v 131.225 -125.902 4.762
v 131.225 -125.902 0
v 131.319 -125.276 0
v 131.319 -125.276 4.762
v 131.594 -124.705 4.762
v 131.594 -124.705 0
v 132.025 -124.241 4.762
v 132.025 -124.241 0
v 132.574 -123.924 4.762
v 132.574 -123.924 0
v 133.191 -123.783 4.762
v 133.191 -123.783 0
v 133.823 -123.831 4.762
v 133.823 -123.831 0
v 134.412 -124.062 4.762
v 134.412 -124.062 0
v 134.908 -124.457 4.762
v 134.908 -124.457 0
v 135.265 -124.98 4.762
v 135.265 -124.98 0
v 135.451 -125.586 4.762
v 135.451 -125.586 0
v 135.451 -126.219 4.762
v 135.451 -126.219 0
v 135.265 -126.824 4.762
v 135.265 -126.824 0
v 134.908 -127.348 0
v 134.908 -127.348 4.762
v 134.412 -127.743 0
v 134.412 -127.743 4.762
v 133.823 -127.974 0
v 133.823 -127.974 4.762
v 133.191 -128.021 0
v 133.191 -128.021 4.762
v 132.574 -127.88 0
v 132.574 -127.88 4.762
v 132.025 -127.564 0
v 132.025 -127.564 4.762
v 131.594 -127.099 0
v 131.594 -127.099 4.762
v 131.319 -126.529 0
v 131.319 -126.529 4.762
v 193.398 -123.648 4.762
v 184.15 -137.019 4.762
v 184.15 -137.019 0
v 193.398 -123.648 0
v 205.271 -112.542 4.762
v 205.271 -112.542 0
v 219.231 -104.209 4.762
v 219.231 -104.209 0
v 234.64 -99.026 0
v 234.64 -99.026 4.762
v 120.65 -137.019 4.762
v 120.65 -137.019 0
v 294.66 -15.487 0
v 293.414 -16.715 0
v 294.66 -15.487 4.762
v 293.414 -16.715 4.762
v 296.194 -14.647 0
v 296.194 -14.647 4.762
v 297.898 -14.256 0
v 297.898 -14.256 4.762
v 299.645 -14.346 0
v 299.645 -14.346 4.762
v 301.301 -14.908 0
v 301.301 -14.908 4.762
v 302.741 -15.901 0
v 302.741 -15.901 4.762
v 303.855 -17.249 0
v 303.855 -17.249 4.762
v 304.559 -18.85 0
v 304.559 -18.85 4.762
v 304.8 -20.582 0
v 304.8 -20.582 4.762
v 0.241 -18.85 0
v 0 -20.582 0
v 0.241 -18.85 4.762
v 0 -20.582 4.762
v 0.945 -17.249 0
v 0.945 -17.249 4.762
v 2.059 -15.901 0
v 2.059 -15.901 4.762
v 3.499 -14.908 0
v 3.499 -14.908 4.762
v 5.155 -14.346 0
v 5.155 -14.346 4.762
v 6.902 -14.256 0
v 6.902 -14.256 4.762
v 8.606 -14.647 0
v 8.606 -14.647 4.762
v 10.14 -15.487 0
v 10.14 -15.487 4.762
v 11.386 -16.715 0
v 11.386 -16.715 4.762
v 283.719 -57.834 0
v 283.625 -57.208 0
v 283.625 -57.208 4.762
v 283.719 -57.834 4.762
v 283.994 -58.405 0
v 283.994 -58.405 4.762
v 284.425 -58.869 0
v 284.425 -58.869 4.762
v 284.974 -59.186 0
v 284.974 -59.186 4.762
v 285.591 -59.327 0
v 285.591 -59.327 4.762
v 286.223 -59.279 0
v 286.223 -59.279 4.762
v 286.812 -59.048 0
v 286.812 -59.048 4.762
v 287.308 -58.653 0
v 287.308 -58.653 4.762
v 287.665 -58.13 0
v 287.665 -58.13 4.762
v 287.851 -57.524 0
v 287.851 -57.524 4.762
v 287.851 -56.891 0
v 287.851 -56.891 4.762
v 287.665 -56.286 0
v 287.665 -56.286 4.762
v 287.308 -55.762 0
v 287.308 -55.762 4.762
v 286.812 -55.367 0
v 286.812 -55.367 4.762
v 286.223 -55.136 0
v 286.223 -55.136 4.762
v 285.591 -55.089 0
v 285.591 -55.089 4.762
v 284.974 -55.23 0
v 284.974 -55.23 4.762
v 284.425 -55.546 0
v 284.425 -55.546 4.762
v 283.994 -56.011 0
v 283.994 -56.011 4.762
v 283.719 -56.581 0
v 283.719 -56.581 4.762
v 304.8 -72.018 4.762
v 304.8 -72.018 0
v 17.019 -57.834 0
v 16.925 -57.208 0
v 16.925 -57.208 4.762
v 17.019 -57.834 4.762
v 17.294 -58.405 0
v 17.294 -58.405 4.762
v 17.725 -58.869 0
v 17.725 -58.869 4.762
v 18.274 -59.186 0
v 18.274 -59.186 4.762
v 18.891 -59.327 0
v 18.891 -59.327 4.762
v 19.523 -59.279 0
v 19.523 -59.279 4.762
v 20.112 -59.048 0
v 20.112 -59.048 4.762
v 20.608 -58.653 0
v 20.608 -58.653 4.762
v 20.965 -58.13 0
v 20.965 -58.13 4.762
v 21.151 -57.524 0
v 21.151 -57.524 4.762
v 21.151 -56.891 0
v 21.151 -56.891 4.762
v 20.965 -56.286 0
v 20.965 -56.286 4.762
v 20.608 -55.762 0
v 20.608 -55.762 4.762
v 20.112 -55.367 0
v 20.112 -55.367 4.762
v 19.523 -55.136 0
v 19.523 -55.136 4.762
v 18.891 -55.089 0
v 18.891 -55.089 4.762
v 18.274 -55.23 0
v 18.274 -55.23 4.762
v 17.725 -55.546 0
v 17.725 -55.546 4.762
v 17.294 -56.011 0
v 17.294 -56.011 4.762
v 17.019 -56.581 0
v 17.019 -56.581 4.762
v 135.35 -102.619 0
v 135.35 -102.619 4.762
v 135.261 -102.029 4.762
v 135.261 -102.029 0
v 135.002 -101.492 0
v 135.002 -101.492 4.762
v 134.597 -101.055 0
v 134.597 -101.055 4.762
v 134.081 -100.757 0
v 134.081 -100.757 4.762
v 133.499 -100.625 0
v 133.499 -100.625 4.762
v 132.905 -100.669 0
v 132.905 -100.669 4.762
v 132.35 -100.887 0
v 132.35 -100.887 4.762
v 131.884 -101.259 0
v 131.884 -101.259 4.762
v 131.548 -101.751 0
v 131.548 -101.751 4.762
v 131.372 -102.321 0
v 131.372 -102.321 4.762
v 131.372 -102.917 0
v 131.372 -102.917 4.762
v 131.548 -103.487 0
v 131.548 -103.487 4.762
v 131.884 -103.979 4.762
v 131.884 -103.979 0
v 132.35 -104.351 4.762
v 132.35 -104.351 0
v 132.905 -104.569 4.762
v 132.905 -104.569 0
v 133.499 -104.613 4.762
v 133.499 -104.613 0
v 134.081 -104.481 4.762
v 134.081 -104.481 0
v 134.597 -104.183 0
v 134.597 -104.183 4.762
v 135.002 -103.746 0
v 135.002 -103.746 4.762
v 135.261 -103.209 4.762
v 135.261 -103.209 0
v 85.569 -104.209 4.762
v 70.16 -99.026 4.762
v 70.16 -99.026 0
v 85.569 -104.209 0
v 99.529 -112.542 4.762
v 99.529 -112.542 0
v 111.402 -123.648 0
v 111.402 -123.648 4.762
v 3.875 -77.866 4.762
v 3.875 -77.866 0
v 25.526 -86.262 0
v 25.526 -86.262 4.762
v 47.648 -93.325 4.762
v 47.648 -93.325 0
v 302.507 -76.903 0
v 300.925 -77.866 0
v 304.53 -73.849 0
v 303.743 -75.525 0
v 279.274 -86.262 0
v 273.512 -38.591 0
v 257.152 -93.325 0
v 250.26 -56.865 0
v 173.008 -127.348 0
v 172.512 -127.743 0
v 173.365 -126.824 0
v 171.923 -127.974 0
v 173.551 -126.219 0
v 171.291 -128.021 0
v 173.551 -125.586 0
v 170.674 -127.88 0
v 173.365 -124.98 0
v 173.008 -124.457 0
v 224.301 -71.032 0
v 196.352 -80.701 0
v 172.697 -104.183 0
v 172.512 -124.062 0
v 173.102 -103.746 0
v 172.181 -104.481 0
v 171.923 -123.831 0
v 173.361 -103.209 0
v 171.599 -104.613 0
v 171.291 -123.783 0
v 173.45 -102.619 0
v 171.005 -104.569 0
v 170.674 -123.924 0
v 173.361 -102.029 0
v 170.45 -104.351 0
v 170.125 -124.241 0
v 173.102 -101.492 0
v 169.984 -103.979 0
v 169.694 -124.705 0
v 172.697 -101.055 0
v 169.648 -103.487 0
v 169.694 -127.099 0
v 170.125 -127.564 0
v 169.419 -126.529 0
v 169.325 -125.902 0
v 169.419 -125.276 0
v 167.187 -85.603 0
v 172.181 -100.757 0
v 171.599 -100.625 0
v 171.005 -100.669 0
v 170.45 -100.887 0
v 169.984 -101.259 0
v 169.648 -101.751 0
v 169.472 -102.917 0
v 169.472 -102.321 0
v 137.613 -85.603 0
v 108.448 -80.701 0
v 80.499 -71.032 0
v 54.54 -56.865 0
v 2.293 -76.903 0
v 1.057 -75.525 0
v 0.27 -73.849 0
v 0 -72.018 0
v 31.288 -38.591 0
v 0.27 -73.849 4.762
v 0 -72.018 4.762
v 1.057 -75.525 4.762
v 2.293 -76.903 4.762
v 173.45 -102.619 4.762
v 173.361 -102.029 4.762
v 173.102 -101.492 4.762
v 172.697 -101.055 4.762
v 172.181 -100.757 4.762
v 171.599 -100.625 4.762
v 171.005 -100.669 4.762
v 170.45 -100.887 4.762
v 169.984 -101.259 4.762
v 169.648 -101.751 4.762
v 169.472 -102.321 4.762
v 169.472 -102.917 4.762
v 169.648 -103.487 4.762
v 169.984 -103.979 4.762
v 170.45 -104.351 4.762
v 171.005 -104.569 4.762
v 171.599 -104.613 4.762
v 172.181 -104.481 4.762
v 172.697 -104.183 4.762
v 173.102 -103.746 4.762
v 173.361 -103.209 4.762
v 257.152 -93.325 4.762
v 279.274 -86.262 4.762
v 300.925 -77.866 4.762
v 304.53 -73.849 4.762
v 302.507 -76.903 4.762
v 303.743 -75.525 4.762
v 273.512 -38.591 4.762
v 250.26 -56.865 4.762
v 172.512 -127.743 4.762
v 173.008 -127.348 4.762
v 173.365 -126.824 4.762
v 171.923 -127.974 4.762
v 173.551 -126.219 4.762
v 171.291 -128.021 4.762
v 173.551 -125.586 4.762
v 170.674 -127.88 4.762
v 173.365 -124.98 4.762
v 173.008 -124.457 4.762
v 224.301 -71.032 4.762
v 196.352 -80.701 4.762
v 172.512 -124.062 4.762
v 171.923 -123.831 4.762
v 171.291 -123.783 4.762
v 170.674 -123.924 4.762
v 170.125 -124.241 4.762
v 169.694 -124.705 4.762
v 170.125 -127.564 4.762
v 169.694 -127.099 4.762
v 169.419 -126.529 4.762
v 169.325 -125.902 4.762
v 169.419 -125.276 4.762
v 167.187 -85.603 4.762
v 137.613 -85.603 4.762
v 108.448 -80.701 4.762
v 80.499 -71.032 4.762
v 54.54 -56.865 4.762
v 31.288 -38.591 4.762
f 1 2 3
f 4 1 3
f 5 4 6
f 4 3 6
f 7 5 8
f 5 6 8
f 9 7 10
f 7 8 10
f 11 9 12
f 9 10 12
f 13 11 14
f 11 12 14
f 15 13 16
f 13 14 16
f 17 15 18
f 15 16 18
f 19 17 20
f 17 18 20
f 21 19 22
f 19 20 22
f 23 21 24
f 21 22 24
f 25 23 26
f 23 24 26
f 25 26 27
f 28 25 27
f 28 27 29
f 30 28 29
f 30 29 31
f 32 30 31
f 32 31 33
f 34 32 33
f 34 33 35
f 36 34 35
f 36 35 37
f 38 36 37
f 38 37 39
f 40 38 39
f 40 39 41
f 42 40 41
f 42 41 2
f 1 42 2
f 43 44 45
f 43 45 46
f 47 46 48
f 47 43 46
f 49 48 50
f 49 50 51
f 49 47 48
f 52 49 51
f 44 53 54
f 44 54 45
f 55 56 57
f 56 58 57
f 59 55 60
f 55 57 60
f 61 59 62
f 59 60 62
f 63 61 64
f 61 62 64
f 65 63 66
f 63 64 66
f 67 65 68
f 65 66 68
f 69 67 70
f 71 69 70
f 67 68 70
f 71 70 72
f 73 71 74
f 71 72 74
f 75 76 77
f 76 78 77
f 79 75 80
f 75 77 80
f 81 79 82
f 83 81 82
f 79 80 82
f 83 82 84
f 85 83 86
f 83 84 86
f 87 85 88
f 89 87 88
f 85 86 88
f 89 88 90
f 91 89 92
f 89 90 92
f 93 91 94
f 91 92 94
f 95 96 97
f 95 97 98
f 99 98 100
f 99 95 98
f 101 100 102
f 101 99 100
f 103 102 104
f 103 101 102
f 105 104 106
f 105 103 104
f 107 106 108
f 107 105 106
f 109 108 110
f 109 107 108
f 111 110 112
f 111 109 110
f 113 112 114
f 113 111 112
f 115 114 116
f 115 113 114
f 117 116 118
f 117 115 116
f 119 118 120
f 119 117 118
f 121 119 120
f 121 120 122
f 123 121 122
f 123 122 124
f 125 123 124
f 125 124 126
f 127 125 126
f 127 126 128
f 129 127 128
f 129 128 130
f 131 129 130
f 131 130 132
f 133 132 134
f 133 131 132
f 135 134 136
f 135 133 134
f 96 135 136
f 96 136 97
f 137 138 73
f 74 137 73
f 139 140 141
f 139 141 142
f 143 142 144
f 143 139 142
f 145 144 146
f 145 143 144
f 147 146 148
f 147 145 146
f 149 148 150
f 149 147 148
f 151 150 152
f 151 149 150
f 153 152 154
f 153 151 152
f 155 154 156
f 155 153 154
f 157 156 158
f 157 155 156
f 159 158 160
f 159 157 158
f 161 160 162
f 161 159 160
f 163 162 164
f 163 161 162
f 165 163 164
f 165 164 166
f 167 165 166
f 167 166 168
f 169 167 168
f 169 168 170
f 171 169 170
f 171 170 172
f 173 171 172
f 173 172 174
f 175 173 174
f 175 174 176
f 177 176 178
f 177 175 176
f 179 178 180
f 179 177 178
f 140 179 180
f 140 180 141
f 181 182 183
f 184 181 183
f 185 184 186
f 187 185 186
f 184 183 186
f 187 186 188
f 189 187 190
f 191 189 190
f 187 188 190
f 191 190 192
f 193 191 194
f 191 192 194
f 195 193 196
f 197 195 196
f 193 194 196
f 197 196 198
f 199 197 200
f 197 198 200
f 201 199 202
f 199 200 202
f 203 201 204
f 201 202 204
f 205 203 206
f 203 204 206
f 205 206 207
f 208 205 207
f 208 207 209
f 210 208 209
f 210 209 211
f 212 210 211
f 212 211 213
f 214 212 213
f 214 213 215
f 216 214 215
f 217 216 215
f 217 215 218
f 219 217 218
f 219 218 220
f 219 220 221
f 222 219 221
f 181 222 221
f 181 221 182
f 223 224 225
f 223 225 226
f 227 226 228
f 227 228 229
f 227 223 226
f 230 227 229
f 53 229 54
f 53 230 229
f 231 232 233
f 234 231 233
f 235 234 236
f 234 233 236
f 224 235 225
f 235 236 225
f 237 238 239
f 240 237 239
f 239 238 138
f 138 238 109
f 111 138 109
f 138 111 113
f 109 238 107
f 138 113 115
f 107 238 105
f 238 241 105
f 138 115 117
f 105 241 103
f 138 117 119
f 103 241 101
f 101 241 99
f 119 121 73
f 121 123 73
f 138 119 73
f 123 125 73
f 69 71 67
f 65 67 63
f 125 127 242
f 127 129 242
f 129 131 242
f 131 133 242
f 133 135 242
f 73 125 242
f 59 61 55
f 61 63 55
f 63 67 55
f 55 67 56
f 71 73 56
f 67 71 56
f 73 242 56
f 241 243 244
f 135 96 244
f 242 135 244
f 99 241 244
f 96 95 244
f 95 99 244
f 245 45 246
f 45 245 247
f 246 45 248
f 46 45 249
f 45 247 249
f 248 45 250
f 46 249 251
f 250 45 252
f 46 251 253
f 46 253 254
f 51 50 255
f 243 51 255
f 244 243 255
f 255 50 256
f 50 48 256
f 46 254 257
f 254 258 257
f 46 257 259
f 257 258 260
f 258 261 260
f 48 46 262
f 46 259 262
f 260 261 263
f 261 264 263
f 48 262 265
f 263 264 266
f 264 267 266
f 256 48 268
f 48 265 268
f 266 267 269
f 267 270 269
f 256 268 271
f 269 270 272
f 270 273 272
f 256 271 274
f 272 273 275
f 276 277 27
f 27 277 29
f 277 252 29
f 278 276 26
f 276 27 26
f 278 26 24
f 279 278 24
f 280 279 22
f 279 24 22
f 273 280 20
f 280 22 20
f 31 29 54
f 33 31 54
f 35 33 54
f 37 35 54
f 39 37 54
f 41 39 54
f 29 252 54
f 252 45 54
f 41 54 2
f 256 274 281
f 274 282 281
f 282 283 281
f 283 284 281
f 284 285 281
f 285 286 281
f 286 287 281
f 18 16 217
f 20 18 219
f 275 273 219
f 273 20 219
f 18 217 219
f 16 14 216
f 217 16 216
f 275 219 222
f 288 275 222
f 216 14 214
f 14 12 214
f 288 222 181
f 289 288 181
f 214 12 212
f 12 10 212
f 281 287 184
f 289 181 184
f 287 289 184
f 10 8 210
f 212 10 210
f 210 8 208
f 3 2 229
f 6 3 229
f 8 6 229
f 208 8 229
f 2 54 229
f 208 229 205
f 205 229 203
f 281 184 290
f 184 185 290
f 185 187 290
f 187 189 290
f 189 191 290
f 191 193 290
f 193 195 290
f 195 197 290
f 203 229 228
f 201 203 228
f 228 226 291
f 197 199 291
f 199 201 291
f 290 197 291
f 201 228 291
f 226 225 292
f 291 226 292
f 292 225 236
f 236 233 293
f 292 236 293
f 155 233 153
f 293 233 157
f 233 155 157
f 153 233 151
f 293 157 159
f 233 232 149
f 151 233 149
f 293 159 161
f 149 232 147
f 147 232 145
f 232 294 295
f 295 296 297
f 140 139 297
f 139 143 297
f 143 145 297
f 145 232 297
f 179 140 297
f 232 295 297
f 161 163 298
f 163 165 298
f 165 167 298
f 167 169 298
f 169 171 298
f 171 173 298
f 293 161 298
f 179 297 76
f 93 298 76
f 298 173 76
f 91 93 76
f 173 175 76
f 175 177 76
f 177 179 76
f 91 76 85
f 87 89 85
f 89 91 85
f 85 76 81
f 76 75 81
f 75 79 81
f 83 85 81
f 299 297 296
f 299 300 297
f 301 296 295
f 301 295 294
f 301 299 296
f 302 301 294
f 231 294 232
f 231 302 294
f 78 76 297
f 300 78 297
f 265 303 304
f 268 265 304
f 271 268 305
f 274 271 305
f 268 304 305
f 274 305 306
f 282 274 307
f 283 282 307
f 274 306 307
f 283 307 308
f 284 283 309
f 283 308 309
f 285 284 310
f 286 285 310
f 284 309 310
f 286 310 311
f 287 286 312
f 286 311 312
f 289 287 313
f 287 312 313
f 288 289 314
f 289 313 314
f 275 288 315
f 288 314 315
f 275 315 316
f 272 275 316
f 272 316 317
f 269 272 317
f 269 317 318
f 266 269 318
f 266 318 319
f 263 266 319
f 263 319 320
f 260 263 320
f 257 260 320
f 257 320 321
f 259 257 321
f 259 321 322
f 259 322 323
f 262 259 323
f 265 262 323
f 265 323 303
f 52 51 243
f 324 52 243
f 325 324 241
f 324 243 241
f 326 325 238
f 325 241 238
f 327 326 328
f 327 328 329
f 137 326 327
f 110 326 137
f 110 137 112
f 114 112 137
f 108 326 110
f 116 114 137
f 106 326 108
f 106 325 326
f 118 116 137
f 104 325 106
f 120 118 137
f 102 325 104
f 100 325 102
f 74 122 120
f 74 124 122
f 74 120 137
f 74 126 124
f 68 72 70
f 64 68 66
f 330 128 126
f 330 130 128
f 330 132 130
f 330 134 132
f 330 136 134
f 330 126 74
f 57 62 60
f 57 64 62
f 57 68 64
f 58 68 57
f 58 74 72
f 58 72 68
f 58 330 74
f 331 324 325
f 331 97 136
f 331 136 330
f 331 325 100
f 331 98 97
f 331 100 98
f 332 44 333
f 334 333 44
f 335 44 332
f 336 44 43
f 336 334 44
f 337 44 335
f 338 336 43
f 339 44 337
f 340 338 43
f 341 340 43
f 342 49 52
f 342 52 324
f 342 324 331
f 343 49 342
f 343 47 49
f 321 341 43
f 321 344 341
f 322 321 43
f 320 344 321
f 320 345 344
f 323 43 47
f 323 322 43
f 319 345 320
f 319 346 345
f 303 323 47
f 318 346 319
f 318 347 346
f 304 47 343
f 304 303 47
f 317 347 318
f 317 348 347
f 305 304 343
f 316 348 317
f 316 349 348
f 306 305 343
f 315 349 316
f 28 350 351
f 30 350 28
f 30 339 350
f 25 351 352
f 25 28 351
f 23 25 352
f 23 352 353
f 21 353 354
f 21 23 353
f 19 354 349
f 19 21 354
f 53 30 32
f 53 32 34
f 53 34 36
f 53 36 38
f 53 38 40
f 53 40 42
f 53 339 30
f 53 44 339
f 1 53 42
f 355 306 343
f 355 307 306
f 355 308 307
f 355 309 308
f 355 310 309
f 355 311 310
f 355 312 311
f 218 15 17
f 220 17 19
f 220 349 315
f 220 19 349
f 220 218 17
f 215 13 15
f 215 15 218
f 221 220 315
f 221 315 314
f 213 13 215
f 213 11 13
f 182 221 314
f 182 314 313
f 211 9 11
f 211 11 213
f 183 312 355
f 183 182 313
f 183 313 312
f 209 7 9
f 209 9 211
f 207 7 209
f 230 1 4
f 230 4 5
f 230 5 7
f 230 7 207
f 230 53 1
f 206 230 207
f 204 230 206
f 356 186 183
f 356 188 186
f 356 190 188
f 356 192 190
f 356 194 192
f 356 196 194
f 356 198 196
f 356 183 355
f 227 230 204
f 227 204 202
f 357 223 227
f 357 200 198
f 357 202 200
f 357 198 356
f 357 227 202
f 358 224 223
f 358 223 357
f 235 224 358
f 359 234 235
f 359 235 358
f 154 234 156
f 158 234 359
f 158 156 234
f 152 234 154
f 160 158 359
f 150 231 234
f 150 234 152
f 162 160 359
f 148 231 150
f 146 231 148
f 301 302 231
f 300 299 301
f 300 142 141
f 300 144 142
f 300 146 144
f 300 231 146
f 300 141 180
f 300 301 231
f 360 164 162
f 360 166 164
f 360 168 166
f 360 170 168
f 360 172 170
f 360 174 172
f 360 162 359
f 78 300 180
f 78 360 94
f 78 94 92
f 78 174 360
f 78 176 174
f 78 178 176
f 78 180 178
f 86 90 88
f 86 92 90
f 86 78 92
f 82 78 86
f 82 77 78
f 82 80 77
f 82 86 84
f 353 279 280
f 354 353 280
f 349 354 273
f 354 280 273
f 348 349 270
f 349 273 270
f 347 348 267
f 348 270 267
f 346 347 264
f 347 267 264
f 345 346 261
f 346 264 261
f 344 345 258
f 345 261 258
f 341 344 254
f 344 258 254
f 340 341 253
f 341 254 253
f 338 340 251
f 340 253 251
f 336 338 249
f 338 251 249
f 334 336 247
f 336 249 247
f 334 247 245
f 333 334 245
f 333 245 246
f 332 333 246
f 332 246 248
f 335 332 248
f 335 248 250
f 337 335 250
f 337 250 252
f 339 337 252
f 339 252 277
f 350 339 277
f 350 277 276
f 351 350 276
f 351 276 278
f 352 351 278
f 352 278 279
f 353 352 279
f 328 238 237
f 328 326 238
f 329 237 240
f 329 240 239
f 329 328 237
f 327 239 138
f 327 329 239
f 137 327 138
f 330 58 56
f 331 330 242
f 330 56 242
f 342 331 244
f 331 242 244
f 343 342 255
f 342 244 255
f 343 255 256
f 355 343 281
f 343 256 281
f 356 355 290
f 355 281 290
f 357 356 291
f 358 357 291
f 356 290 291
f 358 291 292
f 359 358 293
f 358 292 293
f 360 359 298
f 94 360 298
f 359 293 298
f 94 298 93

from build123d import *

# Parameters (mm, degrees)
SKETCH1_R           = 2.125
BOSS_EXTRUDE1_DEPTH = 4.7625
FILLET1_R           = 6.35
FILLET2_R           = 6.35
SKETCH3_W           = 63.5
SKETCH3_H           = 50.8
BOSS_EXTRUDE2_DEPTH = 4.7625
FILLET3_R           = 76.2
SKETCH8_R           = 2.125
CUT_EXTRUDE3_DEPTH  = 19.05
SKETCH10_R          = 2
CUT_EXTRUDE7_DEPTH  = 335.215390296


with BuildPart() as part:
    # Sketch1 → Boss-Extrude1 (new body)
    with BuildSketch(Plane.XY):
        with BuildLine():
            Line((0, 0), (0, -76.2))
            ThreePointArc((0, -76.2), (152.4, -108.007732044), (304.8, -76.2))
            Line((304.8, -76.2), (304.8, 0))
            ThreePointArc((304.8, 0), (152.4, -86.218997603), (0, 0))
        make_face()
        with Locations(Location((19.05, -57.207732044, 0), (0, 0, 180))):
            Circle(SKETCH1_R, mode=Mode.SUBTRACT)
        with Locations(Location((285.75, -57.207732044, 0), (0, 0, 180))):
            Circle(SKETCH1_R, mode=Mode.SUBTRACT)
    extrude(amount=BOSS_EXTRUDE1_DEPTH)

    # Fillet1
    fillet1_edges = [part.edges().sort_by_distance(p)[0] for p in [
        (304.8, 0, 2.38125),
        (0, 0, 2.38125),
    ]]
    fillet(fillet1_edges, radius=FILLET1_R)

    # Fillet2
    fillet2_edges = [part.edges().sort_by_distance(p)[0] for p in [
        (304.8, -76.2, 2.38125),
        (0, -76.2, 2.38125),
    ]]
    fillet(fillet2_edges, radius=FILLET2_R)

    # Sketch3 → Boss-Extrude2 (add)
    with BuildSketch(Plane.XY.offset(4.7625)):
        with Locations((152.4, -111.618997603)):
            Rectangle(SKETCH3_W, SKETCH3_H)
    extrude(amount=-BOSS_EXTRUDE2_DEPTH)

    # Fillet3
    # the kernel refuses this fillet: 76.2 mm, written as the material it adds along each edge
    with BuildSketch(Plane(origin=(184.15, -106.682510638, 4.7625), x_dir=(0.9886965633546299, 0.14993033585883936, 0), z_dir=(0, 0, -1))) as fillet3_piece_1:
        with BuildLine():
            CenterArc((56.174032607, 76.02868739), FILLET3_R, 217.166641645, 48.990660759)
            Line((-4.548359679, 29.993580407), (-5.762807525, 29.072878267))
            ThreePointArc((-5.762807525, 29.072878267), (-3.780953402, 14.768296372), (-1.506773563, -0.228493832))
            Line((-1.506773563, -0.228493832), (0.102134605, -1.520573748))
            ThreePointArc((0.102134605, -1.520573748), (25.533651185, -0.667436951), (50.965167766, -1.520573748))
            Line((50.965167766, -1.520573748), (51.06730237, 0))
        make_face()
    extrude(amount=4.7625)
    with BuildSketch(Plane(origin=(120.65, -106.682510638, 4.7625), x_dir=(0, -1, 0), z_dir=(0, 0, -1))) as fillet3_piece_2:
        with BuildLine():
            CenterArc((66.747110364, 66.938079624), FILLET3_R, 192.465587038, 48.990660759)
            Line((-7.656537796, 50.490066353), (-9.144610759, 50.161106088))
            ThreePointArc((-9.144610759, 50.161106088), (-4.488161518, 25.14496413), (-1.518699114, -0.127))
            Line((-1.518699114, -0.127), (0, -1.524))
            ThreePointArc((0, -1.524), (15.168243483, -1.524), (29.608274497, -1.338761592))
            Line((29.608274497, -1.338761592), (30.336486965, 0))
        make_face()
    extrude(amount=4.7625)

    # Sketch8 → Cut-Extrude3 (cut)
    with BuildSketch(Plane(origin=(0, 0, 0), x_dir=(-1, 0, 0), z_dir=(0, 0, -1))):
        with Locations((-171.45, -125.902330937)):
            Circle(SKETCH8_R)
        with Locations((-133.35, -125.902330937)):
            Circle(SKETCH8_R)
    extrude(amount=-CUT_EXTRUDE3_DEPTH, mode=Mode.SUBTRACT)

    # Sketch10 → Cut-Extrude7 (cut, through all)
    with BuildSketch(Plane.XY.offset(4.7625)):
        with Locations((133.35, -102.618997603)):
            Circle(SKETCH10_R)
        with Locations((171.45, -102.618997603)):
            Circle(SKETCH10_R)
    extrude(amount=-CUT_EXTRUDE7_DEPTH, mode=Mode.SUBTRACT)


solid = part.part
